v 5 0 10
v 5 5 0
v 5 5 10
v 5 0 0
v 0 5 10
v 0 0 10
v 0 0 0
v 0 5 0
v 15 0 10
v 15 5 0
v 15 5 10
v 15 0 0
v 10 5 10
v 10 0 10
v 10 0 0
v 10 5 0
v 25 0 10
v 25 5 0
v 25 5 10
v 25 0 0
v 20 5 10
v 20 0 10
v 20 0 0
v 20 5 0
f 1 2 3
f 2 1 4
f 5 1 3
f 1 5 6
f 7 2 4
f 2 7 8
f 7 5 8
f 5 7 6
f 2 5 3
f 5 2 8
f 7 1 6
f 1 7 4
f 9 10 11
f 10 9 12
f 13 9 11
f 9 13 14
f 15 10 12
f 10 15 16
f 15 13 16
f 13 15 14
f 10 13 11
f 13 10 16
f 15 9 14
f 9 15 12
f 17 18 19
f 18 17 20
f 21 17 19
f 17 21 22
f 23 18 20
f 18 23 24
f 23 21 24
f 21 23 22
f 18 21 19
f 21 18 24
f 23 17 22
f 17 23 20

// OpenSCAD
color("red") {
  cube([5,5,10]);
}
color("green") {
  translate([10,0,0]) {
    cube([5,5,10]);
  }
}

color("blue") {
  translate([20,0,0]) {
    cube([5,5,10]);
  }
}
